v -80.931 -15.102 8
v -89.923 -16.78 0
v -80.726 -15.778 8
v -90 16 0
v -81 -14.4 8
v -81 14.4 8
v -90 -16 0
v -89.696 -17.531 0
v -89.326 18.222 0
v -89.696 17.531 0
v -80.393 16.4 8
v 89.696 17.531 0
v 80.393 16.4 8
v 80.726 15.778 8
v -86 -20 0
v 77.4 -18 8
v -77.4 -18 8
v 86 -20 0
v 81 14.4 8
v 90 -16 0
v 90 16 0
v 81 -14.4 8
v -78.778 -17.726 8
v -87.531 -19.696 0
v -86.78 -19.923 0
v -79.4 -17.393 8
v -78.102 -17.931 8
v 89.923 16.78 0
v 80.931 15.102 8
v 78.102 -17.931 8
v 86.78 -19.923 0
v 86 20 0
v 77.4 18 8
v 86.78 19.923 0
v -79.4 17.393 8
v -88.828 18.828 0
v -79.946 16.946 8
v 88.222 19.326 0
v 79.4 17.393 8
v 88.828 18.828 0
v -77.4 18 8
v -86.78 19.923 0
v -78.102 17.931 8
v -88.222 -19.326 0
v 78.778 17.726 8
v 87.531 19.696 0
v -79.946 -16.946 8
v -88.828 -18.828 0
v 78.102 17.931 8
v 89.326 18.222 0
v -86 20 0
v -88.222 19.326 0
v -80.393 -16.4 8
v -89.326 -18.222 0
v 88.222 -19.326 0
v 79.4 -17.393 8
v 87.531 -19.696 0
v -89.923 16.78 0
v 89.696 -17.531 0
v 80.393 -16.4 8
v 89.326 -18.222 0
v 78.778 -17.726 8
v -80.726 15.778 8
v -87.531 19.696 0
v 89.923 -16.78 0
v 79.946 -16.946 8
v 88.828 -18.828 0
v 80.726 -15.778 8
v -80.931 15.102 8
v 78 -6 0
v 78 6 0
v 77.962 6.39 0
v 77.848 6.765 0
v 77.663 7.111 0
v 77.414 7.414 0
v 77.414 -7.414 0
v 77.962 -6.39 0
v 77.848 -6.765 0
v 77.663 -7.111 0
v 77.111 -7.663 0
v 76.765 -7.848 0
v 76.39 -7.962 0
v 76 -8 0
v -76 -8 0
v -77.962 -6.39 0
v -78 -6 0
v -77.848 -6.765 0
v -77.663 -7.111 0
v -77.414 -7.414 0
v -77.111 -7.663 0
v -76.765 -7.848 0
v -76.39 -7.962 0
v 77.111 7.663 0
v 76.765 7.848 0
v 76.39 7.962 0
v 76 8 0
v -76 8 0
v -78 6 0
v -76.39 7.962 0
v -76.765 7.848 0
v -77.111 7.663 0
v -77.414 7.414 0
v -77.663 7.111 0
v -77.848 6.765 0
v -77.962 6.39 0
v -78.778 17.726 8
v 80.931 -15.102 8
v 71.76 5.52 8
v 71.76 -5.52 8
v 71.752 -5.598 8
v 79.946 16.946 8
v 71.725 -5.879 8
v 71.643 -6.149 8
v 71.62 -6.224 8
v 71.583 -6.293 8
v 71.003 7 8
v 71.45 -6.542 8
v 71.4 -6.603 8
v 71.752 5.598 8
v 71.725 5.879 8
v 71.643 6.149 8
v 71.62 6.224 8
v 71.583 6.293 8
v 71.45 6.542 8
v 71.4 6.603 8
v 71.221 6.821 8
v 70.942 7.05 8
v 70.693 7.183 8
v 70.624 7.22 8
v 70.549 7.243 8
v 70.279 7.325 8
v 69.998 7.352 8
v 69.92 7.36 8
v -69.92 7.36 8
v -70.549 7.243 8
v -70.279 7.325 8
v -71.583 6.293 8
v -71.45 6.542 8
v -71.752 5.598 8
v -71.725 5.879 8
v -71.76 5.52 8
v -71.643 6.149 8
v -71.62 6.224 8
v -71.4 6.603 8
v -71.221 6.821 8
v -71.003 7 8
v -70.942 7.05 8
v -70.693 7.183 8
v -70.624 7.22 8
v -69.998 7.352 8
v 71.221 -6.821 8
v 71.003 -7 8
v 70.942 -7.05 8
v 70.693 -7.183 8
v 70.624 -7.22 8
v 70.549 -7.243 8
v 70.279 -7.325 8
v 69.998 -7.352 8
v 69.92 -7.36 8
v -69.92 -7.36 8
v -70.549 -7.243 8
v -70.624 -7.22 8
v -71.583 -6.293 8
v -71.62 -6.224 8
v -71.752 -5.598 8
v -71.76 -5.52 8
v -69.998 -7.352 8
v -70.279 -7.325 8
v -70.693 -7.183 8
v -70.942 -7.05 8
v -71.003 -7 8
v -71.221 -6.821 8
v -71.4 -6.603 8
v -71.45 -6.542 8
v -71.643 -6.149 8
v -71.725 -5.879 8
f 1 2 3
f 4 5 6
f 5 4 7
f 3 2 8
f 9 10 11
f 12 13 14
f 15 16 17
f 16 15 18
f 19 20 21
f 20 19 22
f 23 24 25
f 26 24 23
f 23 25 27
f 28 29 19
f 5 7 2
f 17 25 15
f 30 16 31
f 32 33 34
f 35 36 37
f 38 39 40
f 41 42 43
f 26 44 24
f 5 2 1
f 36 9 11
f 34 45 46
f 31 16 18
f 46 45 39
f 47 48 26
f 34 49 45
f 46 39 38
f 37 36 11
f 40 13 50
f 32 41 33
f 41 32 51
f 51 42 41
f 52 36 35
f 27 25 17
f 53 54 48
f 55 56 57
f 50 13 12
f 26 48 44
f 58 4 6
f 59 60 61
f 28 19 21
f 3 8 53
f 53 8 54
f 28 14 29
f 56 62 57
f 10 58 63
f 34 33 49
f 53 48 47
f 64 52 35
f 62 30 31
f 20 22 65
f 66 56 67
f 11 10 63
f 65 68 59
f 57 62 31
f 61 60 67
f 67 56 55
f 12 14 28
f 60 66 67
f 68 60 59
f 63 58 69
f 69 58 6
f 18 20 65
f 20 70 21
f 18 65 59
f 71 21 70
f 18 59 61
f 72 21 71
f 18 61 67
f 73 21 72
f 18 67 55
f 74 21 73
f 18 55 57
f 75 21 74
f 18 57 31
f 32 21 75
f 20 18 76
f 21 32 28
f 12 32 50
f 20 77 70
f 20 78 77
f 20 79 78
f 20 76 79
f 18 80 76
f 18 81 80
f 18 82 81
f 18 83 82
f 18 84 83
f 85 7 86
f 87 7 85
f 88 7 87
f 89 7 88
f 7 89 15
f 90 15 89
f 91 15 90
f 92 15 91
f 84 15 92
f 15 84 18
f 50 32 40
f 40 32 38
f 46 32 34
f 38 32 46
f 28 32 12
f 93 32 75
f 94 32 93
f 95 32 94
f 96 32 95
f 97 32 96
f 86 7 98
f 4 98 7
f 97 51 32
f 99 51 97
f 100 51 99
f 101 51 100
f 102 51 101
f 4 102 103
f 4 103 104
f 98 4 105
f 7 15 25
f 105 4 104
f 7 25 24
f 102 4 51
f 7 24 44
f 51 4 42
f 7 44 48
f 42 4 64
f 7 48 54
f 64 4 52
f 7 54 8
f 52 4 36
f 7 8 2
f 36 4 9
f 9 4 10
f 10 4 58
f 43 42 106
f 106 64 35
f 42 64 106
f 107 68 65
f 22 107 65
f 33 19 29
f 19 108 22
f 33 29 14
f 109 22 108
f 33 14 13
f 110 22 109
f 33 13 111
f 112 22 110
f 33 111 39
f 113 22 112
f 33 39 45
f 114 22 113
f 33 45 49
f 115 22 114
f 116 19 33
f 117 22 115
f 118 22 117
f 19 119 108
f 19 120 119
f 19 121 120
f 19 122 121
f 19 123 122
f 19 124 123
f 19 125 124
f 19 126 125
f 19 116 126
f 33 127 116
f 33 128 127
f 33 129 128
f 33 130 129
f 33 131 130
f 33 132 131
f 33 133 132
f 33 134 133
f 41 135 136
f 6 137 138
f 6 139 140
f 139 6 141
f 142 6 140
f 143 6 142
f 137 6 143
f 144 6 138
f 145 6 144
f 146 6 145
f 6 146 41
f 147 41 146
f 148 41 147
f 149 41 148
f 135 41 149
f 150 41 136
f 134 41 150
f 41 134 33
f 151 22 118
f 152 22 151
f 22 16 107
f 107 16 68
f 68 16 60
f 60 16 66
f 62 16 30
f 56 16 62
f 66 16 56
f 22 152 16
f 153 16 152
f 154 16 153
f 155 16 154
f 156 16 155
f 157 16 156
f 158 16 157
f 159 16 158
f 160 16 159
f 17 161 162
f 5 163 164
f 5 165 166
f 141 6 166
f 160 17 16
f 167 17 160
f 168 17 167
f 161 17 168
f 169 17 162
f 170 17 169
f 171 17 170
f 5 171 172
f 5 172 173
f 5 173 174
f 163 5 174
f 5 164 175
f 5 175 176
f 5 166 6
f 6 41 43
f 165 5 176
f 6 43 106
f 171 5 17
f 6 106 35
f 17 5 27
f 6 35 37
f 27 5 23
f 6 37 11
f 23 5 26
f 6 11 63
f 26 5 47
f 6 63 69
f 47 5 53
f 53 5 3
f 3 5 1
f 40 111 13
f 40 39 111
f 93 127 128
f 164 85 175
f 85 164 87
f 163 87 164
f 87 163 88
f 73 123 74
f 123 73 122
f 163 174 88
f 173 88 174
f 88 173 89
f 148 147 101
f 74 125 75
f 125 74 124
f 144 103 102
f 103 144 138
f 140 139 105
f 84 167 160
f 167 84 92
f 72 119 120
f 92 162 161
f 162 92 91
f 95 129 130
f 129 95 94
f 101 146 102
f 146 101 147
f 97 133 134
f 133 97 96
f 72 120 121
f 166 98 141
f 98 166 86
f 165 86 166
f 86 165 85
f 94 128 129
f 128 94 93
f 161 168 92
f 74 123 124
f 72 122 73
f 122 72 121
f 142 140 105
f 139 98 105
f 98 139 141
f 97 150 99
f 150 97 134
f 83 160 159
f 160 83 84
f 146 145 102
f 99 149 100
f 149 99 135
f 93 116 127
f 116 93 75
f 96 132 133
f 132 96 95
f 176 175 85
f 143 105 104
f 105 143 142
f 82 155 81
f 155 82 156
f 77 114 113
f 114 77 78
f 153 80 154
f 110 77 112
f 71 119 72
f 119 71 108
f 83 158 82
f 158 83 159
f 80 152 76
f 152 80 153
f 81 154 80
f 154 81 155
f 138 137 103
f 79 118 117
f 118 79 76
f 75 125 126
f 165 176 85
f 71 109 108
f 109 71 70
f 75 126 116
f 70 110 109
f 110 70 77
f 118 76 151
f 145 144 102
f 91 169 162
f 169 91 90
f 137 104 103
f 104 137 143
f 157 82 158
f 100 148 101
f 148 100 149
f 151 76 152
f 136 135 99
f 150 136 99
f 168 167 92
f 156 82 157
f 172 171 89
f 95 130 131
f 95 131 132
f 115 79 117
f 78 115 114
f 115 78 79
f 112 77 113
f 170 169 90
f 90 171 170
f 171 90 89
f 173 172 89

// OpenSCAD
$fn = 32;

// ----------------------------------------------------------------------
// Display bezel: 180 x 40 mm frame, opening 156x16 mm
// ----------------------------------------------------------------------

// --- parameters (mm) ---
length = 180;             // frame outside length, X
width = 40;               // frame outside width, Y
frame_w = 12;             // frame width
thickness = 8;            // frame thickness
corner_r = 4;             // outside corner radius
chamfer = 0.9;            // outer wall taper
funnel = 0.9;             // inner opening taper
opening_l = 156;          // opening length
opening_w = 16;           // opening width
inner_r = 2;              // opening corner radius

/* rounded-rectangle outlines, generated with loops */
module rounded_ring(l_nom, w_nom, r) {
  hull() {
    for (sx = [-1, 1]) for (sy = [-1, 1])
      translate([sx * (l_nom / 2 - r), sy * (w_nom / 2 - r)]) circle(r = r);
  }
}

difference() {
  /* frame body, drafted so the outer edge is a variable-depth chamfer */
  linear_extrude(height = thickness, scale = chamfer)
    rounded_ring(length, width, corner_r);
  /* viewing opening, drafted the other way for a funnel edge */
  linear_extrude(height = thickness + 2, scale = funnel)
    translate([0, 0, -1]) rounded_ring(opening_l, opening_w, inner_r);
}
